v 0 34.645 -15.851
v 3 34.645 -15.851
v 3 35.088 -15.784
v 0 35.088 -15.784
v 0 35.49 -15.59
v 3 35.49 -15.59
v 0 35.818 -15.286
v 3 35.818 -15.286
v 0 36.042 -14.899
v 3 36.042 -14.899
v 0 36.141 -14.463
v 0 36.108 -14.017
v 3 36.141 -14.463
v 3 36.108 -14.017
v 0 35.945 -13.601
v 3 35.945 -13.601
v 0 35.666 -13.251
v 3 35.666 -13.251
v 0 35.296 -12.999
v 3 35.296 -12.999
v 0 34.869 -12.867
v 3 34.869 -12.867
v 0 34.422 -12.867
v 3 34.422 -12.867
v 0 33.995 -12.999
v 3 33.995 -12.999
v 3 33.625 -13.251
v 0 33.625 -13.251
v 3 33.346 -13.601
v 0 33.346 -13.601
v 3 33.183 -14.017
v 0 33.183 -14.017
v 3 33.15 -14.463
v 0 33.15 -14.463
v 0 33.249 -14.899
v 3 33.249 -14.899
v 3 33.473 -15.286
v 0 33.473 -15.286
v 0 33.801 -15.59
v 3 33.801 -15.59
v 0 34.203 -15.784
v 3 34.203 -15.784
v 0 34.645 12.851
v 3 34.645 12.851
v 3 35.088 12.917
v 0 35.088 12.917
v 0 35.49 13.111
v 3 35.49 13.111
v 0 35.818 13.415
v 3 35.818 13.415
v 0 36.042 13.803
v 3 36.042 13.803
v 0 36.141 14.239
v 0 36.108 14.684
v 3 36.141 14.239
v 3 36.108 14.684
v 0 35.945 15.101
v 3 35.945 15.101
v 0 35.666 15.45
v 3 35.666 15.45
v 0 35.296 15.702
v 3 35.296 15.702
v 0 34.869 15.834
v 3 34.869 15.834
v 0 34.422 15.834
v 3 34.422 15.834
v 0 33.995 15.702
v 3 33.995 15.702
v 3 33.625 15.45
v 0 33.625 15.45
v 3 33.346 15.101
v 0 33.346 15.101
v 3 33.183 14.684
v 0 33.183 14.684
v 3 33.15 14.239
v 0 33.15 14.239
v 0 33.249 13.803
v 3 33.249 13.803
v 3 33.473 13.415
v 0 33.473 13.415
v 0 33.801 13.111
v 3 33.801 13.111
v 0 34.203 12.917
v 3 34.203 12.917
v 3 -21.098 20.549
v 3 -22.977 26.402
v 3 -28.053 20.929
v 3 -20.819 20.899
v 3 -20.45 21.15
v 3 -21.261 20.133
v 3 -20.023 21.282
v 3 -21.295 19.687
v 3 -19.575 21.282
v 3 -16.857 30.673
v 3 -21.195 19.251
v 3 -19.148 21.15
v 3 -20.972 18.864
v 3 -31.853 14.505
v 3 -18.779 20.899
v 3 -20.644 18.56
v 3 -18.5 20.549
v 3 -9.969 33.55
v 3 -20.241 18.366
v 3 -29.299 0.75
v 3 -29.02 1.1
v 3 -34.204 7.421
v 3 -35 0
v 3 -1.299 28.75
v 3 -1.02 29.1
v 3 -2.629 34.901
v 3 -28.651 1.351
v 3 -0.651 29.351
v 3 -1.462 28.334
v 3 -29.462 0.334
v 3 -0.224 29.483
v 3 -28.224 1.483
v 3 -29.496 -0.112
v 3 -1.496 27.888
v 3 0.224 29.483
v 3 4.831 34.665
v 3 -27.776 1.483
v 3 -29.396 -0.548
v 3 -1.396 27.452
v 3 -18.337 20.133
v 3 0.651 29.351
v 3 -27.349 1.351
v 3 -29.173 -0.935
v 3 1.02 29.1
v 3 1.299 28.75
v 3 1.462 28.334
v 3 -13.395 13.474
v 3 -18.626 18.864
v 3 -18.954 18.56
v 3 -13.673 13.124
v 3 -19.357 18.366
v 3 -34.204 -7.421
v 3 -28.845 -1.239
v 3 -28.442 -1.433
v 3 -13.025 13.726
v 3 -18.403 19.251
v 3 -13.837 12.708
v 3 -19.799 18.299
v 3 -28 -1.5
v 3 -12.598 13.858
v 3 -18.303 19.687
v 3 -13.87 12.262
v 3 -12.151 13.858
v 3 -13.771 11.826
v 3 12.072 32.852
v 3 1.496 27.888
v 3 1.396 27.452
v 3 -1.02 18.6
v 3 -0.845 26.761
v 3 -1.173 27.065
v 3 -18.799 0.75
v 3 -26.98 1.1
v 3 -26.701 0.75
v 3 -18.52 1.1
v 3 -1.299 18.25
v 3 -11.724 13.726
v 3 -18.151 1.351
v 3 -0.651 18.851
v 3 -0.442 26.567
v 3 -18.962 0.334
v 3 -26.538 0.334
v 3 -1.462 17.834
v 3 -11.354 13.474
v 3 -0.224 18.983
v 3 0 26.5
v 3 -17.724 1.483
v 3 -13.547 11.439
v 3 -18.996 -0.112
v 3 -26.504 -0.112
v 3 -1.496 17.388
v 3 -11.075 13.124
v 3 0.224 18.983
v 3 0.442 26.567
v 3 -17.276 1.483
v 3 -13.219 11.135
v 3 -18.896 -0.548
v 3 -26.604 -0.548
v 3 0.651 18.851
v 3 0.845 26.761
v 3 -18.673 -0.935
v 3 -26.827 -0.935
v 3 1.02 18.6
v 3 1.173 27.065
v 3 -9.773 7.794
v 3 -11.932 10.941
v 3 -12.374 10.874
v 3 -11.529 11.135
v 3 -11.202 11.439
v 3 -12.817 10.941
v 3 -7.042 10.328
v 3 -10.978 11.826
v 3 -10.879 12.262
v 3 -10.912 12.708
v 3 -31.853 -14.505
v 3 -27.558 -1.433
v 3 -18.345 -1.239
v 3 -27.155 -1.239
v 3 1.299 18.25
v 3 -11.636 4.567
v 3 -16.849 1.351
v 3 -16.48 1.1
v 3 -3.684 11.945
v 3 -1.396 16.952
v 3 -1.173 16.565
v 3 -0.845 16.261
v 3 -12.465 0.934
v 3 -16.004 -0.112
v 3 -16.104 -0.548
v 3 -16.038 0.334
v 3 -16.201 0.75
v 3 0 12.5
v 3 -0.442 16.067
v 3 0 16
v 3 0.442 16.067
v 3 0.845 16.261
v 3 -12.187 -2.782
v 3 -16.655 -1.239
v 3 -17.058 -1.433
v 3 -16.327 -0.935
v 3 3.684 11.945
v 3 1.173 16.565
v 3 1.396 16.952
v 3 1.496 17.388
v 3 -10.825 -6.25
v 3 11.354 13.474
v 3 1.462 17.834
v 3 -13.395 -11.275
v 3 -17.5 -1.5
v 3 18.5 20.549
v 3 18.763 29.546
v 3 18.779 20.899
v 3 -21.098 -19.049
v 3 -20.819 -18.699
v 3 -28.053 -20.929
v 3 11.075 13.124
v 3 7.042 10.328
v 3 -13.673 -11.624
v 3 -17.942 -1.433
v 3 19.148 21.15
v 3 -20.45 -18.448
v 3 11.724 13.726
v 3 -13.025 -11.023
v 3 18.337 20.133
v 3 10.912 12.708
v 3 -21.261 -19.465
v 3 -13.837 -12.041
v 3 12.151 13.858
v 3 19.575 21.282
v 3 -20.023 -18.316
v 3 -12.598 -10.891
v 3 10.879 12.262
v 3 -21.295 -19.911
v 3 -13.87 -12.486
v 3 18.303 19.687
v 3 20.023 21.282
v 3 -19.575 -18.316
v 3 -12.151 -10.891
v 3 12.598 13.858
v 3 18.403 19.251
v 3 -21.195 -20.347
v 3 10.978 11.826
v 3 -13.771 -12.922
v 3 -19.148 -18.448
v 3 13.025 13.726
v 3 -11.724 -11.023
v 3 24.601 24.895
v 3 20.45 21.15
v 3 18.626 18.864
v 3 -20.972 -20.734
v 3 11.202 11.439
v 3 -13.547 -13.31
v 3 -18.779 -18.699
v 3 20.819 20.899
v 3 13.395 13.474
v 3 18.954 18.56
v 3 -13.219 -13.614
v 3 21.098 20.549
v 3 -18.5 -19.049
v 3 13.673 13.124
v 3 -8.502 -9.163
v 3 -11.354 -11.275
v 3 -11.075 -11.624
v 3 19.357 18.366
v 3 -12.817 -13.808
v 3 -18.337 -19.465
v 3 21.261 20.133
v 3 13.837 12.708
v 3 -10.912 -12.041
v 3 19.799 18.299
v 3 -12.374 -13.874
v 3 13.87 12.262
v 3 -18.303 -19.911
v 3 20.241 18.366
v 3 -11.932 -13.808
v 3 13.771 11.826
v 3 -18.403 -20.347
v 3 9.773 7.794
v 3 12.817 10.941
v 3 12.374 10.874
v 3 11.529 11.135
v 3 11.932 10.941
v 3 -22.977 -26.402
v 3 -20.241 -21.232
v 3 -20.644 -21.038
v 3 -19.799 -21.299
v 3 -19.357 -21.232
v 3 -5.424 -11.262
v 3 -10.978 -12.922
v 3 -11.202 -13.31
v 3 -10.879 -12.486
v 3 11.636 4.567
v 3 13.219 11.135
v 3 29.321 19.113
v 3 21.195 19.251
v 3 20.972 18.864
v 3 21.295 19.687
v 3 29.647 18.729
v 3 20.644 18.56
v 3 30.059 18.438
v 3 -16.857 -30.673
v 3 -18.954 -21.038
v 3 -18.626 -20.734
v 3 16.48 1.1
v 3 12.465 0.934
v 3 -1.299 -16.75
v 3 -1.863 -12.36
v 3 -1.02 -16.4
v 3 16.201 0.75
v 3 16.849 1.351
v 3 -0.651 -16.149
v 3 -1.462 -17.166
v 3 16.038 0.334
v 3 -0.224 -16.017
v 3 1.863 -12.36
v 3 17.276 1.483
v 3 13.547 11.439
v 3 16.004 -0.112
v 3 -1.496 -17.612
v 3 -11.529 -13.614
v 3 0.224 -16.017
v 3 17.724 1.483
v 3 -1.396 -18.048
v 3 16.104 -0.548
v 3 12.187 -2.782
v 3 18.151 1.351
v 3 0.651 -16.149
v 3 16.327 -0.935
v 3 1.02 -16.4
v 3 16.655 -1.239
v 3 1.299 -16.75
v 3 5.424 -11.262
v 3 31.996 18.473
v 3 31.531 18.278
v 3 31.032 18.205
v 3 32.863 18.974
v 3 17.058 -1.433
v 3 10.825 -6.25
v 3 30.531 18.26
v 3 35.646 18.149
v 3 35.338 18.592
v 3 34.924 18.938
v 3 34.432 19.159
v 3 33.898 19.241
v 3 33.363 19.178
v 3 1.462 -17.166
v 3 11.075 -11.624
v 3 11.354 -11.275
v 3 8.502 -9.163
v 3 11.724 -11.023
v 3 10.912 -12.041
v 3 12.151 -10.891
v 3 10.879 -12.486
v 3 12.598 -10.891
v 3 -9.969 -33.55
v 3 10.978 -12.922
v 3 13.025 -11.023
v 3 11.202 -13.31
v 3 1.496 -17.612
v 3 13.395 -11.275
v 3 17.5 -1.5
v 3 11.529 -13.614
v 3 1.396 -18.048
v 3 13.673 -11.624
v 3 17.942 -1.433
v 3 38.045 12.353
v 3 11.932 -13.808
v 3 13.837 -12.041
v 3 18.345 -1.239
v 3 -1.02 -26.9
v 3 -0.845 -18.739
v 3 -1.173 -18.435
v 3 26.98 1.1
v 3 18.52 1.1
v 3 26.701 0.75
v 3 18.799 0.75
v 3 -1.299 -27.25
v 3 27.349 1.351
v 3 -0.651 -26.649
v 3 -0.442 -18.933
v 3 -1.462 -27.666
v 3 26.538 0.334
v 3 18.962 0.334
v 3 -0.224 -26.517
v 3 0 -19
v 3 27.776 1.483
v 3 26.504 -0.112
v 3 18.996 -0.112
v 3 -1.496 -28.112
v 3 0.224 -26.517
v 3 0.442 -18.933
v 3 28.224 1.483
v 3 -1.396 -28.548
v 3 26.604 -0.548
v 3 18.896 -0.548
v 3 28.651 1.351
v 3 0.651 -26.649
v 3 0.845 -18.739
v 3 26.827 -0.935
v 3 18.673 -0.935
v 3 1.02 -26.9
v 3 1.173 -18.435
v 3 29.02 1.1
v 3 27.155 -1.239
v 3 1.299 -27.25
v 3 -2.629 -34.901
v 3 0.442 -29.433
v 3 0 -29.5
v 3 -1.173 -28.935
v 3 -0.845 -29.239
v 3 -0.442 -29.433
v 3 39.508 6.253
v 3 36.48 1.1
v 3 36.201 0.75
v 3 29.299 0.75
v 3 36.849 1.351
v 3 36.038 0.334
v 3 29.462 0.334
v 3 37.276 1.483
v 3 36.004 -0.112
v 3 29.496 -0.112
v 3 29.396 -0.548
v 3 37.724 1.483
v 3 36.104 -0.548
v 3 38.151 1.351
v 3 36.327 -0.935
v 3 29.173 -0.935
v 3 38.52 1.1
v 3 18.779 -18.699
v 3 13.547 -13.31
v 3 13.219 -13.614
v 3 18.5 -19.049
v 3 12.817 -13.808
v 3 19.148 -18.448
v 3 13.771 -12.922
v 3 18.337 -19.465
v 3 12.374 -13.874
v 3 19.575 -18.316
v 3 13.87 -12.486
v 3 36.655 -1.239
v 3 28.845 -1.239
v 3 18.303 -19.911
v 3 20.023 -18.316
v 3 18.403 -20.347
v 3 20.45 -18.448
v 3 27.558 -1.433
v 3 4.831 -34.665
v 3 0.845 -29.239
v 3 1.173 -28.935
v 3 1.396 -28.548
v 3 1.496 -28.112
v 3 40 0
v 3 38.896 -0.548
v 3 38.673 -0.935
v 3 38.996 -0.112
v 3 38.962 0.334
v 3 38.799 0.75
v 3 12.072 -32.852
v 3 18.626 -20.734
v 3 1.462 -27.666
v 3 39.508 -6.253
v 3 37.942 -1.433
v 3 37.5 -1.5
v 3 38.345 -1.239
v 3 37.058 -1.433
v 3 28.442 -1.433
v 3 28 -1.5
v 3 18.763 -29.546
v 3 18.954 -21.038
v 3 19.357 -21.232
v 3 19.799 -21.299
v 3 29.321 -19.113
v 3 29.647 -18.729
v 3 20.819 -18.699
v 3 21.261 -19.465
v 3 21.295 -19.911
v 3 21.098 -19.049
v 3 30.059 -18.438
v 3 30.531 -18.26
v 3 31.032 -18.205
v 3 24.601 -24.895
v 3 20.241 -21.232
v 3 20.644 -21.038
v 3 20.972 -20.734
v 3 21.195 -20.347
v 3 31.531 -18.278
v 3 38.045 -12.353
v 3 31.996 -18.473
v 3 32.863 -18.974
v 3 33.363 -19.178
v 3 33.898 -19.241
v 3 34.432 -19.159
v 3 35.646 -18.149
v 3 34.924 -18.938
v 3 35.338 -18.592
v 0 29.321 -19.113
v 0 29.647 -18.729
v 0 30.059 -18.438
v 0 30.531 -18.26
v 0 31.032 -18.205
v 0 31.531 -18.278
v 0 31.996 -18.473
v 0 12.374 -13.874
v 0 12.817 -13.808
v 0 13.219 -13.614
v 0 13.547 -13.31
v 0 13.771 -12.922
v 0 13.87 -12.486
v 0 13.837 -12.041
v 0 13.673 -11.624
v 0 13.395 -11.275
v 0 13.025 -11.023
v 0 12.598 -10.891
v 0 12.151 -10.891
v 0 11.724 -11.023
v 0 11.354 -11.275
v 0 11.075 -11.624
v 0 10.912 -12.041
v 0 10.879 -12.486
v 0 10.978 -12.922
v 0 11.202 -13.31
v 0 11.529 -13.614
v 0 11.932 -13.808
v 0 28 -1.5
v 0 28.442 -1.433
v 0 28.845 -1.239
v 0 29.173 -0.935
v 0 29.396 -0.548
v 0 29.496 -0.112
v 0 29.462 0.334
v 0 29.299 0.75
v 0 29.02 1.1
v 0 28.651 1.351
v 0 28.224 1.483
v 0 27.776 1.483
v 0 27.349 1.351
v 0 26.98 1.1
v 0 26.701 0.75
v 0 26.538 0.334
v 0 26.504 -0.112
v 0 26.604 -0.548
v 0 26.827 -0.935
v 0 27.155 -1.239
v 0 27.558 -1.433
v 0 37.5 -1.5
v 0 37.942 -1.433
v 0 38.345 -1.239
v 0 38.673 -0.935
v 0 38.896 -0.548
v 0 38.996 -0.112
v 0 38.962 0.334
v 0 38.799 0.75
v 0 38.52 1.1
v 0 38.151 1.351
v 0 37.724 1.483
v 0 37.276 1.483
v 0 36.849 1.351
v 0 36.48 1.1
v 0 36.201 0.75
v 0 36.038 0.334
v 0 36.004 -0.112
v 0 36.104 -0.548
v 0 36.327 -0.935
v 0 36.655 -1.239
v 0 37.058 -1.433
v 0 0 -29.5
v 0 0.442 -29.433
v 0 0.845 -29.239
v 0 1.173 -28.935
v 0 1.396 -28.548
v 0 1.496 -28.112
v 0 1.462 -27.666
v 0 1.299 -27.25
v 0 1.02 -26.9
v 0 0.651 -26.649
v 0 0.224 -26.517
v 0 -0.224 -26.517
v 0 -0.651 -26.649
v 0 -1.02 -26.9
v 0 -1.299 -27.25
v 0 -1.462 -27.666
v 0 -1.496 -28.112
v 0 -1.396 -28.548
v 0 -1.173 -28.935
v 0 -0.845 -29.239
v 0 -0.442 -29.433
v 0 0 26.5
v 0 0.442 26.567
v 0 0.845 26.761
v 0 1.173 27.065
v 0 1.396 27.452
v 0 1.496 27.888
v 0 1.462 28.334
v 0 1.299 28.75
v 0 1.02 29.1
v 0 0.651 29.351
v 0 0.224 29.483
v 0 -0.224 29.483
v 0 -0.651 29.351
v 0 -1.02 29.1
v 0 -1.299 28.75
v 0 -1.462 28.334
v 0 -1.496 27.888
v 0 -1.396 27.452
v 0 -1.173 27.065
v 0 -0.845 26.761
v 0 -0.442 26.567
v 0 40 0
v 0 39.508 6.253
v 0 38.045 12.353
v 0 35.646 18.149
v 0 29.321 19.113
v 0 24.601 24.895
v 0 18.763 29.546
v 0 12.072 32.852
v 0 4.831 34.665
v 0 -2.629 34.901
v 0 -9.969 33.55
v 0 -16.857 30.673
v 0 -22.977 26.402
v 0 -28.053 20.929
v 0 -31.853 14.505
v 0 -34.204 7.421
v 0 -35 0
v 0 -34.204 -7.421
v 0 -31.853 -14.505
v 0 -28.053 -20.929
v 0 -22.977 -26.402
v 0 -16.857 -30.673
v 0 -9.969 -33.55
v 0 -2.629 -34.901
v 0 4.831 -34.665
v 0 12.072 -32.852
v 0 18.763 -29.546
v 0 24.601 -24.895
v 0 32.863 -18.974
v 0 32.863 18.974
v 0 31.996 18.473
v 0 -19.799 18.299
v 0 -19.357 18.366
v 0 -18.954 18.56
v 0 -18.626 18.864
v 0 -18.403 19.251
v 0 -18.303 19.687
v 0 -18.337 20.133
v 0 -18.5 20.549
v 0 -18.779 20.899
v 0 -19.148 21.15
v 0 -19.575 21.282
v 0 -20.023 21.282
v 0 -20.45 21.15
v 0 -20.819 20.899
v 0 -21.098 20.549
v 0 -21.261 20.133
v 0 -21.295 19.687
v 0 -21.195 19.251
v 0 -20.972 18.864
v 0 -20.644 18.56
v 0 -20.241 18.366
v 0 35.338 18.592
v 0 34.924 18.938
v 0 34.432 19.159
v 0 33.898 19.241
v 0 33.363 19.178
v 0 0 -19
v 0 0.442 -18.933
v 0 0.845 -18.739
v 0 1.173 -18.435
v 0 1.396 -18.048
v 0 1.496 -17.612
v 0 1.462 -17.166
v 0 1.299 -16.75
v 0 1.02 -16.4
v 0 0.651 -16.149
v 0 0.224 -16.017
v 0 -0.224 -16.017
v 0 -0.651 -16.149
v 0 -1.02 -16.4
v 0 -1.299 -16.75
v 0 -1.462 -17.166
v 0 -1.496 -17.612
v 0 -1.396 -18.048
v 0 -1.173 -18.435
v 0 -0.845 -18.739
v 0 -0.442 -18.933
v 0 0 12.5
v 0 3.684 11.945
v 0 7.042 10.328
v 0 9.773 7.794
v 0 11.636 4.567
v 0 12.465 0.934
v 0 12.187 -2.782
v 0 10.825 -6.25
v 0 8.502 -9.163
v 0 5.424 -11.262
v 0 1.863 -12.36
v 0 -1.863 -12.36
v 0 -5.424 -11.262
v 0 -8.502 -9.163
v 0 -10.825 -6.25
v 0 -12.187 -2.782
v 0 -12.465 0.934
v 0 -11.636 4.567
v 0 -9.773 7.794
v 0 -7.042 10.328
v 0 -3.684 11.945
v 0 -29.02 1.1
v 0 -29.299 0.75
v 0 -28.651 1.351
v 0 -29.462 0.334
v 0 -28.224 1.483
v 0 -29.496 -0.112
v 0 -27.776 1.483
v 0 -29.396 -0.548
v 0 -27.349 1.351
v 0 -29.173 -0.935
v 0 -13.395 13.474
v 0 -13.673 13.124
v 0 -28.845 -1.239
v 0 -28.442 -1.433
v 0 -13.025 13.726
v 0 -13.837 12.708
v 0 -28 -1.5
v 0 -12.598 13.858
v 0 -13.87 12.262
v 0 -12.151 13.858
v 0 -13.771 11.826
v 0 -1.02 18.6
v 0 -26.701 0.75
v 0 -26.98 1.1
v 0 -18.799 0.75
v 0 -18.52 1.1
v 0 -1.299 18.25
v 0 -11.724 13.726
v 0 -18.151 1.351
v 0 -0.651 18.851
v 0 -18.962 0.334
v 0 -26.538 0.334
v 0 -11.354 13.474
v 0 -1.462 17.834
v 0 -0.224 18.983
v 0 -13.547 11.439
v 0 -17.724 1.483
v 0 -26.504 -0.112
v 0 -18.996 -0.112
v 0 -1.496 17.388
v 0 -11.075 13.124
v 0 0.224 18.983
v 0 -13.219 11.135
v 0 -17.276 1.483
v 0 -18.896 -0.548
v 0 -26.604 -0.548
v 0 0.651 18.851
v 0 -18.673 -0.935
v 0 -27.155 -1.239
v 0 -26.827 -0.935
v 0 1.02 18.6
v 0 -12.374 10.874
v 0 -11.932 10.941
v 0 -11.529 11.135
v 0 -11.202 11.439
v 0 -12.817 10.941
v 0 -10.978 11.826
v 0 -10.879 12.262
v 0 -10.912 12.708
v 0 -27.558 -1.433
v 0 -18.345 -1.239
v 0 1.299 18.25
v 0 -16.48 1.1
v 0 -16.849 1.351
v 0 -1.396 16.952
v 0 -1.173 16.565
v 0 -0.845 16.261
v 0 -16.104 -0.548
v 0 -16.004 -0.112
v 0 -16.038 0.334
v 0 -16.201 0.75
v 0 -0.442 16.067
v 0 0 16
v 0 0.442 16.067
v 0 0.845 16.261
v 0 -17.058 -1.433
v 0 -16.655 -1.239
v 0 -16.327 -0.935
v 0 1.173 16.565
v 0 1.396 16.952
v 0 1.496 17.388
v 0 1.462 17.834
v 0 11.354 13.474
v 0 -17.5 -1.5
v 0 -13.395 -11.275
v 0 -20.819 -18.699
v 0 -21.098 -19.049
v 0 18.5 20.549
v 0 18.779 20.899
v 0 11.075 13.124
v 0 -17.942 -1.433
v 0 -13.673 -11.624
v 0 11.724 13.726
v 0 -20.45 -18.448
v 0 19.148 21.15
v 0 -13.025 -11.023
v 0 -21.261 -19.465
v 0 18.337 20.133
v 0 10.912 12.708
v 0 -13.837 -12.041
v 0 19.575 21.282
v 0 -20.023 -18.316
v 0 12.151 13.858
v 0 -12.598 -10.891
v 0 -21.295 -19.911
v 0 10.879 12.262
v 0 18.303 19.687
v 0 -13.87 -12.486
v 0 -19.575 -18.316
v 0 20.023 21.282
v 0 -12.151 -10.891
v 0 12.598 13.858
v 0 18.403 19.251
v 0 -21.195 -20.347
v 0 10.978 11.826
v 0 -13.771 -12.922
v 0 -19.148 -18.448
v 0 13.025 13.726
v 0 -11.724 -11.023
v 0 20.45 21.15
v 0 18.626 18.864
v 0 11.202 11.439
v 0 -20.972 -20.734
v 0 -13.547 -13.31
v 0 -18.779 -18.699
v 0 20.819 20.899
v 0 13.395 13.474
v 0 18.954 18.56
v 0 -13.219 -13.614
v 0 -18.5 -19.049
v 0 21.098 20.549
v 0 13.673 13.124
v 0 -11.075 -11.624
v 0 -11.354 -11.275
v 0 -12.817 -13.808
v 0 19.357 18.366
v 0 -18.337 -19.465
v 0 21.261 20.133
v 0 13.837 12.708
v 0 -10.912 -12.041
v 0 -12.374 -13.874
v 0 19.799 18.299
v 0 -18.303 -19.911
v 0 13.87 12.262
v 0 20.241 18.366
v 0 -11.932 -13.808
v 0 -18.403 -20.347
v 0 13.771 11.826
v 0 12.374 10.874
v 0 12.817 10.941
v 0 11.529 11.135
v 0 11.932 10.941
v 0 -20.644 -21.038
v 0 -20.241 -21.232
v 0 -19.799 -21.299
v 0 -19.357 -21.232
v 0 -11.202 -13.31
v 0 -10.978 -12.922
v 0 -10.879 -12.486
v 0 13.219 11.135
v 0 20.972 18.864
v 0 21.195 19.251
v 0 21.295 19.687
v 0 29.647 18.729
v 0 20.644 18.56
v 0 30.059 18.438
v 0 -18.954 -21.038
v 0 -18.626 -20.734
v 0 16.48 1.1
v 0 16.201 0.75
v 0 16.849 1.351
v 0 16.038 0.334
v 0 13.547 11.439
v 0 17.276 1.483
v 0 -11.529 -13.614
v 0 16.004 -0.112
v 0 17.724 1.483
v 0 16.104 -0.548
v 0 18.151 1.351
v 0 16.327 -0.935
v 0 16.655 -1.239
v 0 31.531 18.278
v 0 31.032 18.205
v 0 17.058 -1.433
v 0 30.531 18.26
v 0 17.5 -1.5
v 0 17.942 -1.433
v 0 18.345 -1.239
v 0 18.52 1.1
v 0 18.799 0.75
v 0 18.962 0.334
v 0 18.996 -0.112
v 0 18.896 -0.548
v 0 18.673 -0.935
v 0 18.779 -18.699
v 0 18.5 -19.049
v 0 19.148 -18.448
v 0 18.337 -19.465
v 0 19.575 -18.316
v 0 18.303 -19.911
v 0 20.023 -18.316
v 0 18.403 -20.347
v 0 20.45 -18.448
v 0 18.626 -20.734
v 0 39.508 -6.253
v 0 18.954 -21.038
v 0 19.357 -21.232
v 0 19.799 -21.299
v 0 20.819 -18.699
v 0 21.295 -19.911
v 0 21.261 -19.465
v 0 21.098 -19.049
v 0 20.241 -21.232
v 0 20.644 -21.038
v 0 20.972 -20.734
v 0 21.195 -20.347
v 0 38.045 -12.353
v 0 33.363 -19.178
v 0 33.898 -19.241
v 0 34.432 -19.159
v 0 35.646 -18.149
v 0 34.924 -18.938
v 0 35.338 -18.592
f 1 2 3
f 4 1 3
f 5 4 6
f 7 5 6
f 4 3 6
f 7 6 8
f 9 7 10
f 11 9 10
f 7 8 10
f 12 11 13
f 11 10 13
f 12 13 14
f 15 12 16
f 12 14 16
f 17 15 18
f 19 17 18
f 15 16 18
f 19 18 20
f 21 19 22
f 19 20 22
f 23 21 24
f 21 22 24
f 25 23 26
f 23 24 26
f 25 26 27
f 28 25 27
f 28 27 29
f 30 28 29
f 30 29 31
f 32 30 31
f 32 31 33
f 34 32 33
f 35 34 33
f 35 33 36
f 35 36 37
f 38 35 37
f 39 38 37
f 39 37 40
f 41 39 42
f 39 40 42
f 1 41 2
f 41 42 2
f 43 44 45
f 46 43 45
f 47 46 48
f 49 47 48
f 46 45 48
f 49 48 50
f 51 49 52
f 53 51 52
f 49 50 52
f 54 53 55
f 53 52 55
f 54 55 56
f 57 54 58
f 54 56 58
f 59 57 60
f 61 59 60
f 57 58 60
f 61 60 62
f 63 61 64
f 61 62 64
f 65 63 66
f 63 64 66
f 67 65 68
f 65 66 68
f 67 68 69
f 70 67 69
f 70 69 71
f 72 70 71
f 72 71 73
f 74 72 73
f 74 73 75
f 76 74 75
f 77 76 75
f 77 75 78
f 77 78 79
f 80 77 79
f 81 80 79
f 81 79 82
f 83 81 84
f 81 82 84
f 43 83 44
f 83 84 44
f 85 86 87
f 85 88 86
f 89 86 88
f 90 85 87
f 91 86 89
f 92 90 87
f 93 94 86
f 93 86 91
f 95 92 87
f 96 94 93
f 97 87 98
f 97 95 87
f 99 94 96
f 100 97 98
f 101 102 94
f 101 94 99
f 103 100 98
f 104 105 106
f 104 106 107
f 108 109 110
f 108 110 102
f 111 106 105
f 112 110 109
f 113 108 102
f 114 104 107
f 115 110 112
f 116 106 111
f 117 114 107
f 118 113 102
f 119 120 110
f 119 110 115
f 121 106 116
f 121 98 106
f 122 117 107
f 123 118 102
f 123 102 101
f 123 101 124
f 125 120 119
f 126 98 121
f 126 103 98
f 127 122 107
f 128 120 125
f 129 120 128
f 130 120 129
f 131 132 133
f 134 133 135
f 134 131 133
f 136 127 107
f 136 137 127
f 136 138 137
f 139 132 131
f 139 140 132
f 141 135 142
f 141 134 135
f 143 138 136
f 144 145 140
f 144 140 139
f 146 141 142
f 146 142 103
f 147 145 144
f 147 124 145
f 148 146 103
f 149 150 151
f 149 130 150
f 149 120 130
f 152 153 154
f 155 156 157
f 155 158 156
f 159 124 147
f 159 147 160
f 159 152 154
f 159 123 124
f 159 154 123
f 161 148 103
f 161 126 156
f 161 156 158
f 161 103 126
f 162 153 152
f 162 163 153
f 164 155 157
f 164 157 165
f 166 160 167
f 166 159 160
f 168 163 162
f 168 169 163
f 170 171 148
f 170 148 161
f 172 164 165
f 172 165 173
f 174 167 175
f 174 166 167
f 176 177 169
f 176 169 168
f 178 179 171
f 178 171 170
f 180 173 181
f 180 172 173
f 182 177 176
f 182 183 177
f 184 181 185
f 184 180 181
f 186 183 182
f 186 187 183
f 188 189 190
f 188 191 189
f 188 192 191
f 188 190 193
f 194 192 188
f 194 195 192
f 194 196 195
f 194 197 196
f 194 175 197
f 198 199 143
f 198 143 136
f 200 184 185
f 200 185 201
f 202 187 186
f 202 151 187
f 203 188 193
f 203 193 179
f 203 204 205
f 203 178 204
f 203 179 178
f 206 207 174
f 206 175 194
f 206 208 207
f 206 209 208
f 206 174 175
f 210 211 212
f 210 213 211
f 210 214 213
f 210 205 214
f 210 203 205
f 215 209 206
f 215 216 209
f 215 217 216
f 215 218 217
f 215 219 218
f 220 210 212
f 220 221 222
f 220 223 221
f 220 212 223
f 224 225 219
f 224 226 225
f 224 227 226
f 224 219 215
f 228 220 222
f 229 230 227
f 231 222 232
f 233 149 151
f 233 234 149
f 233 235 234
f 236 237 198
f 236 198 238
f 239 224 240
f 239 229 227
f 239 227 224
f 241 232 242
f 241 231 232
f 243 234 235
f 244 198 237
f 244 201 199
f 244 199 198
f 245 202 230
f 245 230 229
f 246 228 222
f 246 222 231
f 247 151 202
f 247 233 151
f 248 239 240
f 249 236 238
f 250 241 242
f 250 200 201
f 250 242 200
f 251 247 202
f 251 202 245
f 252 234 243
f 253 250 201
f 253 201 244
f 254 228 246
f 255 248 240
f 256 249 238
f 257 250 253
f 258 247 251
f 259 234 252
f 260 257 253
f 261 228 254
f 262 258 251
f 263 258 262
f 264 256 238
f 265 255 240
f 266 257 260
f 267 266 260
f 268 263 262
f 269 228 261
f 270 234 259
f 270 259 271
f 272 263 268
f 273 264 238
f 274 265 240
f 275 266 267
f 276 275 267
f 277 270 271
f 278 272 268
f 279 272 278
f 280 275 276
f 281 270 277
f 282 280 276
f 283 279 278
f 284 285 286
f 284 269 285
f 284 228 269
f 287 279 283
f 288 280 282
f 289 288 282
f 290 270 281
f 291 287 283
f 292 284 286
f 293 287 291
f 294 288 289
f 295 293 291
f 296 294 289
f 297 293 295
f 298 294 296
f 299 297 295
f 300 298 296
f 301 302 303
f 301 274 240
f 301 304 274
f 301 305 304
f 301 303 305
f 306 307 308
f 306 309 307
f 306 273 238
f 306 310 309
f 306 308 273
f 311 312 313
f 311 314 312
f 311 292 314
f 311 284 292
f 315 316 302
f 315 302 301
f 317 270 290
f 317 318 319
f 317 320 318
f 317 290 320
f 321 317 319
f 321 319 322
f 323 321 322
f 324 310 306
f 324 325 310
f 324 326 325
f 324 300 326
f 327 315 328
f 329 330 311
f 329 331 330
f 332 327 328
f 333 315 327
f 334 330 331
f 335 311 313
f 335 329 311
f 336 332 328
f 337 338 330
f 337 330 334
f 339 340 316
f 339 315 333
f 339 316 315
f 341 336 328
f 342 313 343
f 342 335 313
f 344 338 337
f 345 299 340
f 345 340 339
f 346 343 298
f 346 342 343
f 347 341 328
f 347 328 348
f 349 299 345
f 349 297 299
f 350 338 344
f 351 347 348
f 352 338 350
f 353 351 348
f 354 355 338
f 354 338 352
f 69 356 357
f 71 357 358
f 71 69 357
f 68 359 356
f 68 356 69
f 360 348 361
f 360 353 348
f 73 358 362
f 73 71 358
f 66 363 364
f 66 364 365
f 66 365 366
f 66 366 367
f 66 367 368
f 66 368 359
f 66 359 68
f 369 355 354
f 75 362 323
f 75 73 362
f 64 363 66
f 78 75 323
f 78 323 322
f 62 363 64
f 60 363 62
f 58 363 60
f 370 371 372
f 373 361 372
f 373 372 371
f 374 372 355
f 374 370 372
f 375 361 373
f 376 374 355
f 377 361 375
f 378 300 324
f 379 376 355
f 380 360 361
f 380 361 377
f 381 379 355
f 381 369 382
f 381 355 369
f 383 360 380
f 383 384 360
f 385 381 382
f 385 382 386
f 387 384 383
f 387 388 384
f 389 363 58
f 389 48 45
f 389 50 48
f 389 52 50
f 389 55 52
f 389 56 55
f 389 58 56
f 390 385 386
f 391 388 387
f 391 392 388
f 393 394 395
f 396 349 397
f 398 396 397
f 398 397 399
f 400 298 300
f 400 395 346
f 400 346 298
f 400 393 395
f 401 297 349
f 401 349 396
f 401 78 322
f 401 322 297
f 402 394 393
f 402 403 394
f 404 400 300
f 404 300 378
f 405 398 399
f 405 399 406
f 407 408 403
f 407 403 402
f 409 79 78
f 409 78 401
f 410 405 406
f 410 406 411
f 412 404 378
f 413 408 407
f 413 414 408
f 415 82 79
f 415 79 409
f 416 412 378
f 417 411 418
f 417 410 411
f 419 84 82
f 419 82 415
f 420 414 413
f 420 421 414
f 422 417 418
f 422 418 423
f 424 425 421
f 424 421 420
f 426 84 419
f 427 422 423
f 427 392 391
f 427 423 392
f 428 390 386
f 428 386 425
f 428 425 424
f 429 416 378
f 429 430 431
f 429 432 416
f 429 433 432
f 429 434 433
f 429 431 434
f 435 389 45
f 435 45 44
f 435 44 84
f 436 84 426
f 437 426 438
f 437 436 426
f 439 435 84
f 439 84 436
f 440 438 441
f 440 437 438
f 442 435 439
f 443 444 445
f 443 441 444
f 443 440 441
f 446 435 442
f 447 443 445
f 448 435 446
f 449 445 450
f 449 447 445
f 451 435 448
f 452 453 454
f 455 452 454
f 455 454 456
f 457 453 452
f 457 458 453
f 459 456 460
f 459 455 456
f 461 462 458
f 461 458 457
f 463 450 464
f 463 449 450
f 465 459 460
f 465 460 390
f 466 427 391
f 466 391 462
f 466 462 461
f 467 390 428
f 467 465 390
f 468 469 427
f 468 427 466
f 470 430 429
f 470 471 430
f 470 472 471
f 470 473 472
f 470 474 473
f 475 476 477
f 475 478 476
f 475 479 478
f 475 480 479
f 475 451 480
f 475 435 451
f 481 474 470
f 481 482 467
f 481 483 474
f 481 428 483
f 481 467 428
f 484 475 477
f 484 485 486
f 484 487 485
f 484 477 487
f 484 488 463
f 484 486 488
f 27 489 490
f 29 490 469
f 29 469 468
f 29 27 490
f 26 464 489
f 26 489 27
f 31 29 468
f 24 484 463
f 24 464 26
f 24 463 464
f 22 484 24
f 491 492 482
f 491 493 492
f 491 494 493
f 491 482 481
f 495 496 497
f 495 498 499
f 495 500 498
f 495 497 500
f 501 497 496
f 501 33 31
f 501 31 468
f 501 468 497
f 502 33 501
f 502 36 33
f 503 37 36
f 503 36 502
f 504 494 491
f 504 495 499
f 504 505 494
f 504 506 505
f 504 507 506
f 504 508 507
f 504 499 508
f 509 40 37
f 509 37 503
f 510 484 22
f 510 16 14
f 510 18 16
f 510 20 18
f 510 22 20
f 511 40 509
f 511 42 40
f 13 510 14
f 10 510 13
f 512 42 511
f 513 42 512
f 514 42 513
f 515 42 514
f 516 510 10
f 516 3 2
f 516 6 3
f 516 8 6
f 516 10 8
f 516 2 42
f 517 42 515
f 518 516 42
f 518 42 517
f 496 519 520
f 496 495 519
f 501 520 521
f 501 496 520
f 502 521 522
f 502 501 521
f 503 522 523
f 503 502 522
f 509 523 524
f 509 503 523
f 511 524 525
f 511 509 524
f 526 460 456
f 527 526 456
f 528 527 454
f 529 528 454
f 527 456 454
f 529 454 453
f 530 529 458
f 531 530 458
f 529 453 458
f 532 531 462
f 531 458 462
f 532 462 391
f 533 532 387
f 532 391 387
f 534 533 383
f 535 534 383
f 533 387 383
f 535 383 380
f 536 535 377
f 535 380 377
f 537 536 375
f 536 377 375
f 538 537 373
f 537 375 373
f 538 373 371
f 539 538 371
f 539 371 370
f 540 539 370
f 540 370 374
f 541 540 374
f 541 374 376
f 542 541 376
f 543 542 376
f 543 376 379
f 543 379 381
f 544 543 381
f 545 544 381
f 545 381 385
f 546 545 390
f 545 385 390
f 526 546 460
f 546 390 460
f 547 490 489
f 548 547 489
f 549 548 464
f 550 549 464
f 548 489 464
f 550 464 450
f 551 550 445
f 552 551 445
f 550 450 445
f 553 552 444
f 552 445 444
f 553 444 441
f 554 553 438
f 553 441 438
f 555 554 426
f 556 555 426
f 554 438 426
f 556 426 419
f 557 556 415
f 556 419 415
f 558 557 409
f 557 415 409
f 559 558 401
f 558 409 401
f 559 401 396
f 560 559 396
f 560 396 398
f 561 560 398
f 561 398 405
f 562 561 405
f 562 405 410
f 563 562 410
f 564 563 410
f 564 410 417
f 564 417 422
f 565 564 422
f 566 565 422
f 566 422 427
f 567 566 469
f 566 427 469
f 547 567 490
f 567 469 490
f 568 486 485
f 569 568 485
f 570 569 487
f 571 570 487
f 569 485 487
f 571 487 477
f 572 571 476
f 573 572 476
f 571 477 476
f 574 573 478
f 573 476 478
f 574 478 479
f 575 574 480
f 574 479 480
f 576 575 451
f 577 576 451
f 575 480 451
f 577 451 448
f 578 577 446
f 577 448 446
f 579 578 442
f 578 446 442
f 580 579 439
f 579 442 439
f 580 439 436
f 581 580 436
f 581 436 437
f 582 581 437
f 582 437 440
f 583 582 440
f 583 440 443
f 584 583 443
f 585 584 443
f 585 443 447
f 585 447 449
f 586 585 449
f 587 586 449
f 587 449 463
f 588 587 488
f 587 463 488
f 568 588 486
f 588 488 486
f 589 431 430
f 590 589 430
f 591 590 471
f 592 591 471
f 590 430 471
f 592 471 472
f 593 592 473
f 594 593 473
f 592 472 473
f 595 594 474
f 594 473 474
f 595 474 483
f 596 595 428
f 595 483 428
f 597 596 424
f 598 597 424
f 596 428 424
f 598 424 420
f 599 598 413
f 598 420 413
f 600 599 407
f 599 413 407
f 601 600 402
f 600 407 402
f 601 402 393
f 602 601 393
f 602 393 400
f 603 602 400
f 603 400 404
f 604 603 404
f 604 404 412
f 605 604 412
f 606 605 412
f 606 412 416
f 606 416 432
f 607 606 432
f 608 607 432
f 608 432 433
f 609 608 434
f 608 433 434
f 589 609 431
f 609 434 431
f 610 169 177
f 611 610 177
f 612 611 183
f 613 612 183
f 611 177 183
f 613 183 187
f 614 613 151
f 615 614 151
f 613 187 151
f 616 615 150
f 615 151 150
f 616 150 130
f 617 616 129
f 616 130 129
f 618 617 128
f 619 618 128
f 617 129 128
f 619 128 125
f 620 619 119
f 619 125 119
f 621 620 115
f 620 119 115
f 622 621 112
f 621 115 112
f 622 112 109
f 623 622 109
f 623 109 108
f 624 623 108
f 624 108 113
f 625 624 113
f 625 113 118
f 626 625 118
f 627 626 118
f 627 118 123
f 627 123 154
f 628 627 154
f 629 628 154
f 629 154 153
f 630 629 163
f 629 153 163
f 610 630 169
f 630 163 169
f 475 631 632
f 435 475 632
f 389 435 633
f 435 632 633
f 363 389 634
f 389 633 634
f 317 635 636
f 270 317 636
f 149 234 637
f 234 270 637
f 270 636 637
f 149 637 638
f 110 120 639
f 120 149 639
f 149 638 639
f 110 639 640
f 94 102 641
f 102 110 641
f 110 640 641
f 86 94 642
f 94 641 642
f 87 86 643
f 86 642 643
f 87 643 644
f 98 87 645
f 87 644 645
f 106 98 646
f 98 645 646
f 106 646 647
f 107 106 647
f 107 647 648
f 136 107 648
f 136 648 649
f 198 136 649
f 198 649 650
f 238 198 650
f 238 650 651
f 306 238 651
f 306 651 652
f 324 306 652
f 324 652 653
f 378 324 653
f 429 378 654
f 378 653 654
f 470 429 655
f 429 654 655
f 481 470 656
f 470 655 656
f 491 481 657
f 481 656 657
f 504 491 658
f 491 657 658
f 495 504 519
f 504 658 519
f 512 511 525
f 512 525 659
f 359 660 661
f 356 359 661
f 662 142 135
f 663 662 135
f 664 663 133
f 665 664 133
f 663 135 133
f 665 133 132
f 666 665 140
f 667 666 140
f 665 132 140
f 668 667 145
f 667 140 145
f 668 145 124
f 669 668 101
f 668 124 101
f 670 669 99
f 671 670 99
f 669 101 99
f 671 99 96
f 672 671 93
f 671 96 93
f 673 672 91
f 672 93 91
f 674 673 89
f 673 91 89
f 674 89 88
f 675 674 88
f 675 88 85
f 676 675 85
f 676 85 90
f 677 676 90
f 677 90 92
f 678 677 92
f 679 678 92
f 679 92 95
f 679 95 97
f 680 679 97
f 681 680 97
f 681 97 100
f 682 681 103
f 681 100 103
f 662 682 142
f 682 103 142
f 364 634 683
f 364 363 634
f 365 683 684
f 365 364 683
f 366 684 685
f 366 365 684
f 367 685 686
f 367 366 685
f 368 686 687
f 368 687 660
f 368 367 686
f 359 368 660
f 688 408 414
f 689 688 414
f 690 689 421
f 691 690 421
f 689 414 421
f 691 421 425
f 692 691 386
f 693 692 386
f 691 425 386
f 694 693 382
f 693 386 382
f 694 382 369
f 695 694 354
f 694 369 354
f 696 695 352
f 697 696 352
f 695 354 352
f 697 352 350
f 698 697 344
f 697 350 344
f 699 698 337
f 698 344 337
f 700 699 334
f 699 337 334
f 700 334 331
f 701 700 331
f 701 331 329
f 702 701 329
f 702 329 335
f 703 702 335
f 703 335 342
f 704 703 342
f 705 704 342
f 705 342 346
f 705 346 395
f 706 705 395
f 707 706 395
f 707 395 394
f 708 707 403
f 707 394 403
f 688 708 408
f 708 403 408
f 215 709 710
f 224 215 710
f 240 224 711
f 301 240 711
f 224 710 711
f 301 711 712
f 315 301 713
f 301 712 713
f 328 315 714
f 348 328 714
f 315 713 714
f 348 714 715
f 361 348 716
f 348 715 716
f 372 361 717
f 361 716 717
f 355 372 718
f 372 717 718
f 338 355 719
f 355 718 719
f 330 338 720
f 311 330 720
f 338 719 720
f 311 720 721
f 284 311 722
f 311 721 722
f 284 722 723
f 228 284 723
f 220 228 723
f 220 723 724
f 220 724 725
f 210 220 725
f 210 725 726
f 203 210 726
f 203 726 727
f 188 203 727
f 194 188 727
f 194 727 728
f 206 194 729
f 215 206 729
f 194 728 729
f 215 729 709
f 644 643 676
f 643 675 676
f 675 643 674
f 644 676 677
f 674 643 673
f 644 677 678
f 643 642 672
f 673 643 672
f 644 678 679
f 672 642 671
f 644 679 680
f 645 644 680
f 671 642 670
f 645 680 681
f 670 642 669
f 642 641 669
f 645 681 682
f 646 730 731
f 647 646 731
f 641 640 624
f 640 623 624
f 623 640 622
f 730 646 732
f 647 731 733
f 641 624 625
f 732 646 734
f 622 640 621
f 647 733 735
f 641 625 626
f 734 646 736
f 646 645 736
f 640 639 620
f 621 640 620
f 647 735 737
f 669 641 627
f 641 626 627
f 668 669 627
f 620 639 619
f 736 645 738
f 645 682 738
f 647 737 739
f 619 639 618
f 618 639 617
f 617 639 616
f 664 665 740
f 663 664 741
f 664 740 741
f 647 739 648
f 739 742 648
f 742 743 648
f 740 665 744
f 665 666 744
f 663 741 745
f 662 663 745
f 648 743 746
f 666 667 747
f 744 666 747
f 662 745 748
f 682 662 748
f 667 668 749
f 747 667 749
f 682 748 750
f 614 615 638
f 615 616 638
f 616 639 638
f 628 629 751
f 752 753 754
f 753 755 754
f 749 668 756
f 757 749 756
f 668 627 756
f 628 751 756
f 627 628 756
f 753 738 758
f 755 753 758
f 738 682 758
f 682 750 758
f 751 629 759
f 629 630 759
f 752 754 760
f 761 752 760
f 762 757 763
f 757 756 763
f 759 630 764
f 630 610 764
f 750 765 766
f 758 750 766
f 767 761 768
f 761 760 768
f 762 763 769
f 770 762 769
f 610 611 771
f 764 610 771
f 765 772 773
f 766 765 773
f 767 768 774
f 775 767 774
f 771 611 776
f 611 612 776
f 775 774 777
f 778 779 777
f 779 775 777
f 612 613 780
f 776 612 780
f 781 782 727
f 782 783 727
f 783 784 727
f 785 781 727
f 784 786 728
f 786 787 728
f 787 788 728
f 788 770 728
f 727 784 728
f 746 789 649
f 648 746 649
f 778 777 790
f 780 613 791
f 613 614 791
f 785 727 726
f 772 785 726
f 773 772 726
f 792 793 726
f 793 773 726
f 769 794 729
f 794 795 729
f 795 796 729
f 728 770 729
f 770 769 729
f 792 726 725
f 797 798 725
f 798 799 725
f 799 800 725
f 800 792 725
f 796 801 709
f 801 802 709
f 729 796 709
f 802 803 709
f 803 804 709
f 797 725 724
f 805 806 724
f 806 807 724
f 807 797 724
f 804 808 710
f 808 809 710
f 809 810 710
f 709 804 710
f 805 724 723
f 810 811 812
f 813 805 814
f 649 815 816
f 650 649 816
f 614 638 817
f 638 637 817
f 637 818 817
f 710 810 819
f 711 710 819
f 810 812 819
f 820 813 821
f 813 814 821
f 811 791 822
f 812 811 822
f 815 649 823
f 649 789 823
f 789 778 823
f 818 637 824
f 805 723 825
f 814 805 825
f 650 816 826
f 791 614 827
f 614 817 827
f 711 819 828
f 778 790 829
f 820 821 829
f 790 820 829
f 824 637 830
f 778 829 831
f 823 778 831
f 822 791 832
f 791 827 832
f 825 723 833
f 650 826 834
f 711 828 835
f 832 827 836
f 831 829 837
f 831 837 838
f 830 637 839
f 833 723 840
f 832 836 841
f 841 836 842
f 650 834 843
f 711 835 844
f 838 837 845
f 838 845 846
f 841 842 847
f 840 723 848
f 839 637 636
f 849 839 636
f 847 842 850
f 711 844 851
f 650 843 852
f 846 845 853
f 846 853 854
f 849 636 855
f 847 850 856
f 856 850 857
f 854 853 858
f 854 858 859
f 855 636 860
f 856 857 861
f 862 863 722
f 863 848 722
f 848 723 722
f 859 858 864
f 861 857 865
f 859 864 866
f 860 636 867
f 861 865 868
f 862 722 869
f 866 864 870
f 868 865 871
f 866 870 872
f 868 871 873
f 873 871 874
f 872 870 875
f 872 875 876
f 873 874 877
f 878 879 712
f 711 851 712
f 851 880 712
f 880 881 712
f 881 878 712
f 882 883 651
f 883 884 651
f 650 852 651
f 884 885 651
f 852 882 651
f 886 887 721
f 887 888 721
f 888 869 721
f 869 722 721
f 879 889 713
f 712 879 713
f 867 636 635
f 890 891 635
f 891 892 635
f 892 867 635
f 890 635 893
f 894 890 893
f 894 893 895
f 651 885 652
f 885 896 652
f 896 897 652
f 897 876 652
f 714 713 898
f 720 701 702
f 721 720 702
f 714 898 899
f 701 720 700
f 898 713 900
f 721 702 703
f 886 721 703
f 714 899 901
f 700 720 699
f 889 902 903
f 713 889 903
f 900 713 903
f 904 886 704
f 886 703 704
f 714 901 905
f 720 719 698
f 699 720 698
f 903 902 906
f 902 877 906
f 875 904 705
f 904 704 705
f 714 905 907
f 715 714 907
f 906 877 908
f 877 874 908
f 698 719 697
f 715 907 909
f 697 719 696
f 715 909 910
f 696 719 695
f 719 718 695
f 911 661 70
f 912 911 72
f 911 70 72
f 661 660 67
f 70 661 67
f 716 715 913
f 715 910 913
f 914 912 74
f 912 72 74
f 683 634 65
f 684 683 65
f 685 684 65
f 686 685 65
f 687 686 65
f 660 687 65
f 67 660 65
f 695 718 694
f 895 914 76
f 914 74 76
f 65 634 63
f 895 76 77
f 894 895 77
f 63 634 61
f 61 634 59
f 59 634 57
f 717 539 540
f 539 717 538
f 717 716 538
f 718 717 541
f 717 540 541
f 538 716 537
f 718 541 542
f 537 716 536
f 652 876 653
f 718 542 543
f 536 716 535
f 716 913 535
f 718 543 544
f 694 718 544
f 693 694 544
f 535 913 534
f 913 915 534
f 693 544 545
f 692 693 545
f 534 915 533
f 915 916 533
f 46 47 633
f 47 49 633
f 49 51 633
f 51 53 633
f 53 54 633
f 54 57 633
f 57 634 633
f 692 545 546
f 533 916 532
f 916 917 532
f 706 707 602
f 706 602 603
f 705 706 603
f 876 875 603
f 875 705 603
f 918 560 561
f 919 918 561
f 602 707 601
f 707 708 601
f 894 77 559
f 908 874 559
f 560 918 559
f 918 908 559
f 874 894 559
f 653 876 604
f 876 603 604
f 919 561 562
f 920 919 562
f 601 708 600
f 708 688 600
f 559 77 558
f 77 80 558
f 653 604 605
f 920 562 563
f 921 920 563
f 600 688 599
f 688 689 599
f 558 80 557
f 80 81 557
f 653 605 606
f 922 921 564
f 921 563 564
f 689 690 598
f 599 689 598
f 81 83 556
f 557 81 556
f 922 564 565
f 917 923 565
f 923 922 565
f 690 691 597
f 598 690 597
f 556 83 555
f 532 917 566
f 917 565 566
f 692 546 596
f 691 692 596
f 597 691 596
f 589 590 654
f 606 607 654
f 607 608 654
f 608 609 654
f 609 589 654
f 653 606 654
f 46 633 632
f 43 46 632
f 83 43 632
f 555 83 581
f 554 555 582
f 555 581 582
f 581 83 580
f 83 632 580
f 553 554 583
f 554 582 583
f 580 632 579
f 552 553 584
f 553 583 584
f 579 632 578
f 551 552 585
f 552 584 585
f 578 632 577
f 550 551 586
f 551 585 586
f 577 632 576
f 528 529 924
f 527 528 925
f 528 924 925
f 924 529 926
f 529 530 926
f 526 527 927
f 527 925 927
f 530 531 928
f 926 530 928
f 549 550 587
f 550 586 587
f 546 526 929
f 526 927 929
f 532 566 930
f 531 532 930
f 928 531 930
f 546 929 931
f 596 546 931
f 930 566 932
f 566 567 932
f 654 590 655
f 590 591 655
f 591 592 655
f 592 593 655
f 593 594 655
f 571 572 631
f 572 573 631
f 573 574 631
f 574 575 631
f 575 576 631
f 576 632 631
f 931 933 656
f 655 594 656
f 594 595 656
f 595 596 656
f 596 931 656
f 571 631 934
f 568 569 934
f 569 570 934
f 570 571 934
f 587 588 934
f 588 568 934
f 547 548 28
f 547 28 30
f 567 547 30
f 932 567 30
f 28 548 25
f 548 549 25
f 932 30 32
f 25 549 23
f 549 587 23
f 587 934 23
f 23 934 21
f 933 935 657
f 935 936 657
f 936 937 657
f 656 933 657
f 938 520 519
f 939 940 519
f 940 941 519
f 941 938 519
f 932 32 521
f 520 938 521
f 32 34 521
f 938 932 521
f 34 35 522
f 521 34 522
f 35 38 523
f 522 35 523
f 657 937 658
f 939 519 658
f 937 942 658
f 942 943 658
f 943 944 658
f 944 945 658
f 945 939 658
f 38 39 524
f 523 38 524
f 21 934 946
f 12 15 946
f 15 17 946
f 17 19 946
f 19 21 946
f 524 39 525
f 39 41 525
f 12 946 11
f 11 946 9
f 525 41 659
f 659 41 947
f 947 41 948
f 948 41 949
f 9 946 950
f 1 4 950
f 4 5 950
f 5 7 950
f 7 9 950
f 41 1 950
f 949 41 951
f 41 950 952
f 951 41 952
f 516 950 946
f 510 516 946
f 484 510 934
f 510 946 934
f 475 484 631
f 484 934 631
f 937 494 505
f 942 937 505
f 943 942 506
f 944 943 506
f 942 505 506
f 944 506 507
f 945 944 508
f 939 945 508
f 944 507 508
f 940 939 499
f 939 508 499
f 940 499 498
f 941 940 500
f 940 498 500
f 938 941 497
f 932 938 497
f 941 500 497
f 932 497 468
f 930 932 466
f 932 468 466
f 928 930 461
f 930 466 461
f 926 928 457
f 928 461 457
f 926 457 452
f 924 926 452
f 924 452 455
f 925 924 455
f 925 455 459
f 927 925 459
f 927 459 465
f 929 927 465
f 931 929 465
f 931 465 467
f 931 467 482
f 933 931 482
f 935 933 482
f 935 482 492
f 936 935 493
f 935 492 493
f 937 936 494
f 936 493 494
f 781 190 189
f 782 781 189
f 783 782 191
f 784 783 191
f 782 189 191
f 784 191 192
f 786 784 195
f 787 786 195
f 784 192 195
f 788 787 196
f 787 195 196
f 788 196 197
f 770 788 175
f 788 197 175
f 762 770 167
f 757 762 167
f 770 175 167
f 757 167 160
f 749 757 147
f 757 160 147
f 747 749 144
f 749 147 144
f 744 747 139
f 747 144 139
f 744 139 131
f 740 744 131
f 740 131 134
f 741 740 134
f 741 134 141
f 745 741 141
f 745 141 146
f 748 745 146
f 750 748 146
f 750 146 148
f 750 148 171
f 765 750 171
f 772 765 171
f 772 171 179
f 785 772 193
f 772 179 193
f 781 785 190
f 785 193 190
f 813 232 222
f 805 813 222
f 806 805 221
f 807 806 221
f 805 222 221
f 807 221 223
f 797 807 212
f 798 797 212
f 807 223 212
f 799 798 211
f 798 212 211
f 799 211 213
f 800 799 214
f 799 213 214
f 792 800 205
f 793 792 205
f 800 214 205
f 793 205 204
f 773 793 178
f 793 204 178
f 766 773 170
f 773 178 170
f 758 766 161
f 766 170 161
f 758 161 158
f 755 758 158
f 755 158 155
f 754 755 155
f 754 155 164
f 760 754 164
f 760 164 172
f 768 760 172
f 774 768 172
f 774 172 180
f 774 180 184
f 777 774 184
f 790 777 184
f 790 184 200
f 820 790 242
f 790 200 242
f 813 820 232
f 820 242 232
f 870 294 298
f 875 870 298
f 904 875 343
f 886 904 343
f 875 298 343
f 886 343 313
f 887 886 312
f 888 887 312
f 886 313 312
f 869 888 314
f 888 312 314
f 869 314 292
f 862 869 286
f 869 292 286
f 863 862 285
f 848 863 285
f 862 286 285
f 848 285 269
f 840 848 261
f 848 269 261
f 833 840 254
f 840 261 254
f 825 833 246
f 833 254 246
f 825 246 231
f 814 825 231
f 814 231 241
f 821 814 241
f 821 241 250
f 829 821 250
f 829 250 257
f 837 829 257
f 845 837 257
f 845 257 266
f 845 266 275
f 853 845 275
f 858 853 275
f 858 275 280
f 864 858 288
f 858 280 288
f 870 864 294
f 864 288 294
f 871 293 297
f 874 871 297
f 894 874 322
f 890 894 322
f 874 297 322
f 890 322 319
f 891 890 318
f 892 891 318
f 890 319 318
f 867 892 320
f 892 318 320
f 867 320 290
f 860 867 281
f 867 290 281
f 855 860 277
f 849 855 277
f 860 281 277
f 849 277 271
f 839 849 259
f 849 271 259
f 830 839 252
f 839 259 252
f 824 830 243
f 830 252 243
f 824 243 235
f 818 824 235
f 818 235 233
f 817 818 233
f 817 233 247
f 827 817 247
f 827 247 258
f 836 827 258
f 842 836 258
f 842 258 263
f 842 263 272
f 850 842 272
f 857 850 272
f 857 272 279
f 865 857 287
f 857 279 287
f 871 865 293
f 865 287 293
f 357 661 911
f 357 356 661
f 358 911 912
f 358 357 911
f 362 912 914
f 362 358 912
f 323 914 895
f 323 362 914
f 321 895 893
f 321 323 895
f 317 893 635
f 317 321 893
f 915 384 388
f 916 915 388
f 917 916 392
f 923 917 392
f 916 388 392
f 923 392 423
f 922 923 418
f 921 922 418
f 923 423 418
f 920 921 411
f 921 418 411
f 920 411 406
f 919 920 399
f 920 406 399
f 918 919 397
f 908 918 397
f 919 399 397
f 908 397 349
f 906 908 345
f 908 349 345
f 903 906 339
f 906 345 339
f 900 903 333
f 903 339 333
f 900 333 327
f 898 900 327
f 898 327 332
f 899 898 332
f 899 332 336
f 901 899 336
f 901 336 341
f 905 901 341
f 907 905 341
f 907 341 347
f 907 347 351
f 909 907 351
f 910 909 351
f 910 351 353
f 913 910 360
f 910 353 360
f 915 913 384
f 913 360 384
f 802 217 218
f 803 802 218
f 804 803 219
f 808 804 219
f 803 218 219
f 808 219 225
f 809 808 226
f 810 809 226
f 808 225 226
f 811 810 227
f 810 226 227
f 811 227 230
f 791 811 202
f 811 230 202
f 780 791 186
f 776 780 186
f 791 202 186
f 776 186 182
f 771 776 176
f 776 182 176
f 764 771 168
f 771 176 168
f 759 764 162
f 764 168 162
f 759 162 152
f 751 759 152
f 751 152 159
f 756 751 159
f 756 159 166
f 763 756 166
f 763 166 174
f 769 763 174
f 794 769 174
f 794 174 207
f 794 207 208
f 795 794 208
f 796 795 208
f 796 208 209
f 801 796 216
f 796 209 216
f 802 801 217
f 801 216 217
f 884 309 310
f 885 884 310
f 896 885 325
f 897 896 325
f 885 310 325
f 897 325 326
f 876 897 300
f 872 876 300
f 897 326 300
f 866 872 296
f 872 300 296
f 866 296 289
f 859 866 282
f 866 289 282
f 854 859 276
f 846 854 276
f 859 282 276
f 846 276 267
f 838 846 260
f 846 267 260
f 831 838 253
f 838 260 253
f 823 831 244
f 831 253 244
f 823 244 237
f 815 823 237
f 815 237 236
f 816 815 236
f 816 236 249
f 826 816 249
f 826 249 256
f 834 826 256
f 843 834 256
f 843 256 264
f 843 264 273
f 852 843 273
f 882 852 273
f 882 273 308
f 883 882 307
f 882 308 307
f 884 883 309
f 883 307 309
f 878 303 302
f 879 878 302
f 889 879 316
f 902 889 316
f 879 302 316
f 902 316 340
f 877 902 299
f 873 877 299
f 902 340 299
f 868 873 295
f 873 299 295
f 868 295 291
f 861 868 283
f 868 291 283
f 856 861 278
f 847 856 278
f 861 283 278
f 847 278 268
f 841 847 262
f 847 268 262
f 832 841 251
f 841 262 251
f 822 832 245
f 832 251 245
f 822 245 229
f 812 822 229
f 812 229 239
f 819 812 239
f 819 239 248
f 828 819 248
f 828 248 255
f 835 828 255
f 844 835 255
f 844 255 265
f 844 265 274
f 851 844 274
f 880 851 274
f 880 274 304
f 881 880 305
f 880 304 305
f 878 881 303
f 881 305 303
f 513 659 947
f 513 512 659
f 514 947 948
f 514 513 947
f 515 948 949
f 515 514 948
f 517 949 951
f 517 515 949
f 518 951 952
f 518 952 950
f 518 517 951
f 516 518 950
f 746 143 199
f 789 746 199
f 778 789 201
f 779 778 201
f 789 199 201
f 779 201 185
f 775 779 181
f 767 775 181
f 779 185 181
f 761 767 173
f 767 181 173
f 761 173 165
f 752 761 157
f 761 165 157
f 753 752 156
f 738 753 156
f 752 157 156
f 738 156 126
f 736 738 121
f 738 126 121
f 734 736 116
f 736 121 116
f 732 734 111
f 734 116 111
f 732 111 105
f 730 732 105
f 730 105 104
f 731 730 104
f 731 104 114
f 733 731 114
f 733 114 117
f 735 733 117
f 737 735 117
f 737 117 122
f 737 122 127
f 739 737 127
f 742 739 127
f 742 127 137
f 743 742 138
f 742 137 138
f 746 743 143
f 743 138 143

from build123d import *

# Parameters (mm, degrees)
SKETCH_1_R          = 35
EXTRUDE_1_DEPTH     = 3
SKETCH_2_R          = 1.5
CUT_EXTRUDE_1_DEPTH = 3
SKETCH_3_R          = 1.5
CUT_EXTRUDE_2_DEPTH = 3
SKETCH_4_R          = 12.5
CUT_EXTRUDE_3_DEPTH = 3
EXTRUDE_START       = -3
EXTRUDE_4_DEPTH     = 3
FILLET_1_R          = 2
FILLET_2_R          = 2
FILLET_3_R          = 2
FILLET_4_R          = 2
SKETCH_6_R          = 1.5
CUT_EXTRUDE_4_DEPTH = 3


with BuildPart() as part:
    # 草图1 → 凸台-拉伸1 (new body)
    with BuildSketch(Plane(origin=(0, 0, 0), x_dir=(0, 0, -1), z_dir=(1, 0, 0))):
        Circle(SKETCH_1_R)
    extrude(amount=EXTRUDE_1_DEPTH)

    # 草图2 → 切除-拉伸1 (cut)
    with BuildSketch(Plane(origin=(3, 0, 0), x_dir=(0, 0, -1), z_dir=(1, 0, 0))):
        with Locations((0, 28)):
            Circle(SKETCH_2_R)
        with Locations((19.798989873, 19.798989873)):
            Circle(SKETCH_2_R)
        with Locations((28, 0)):
            Circle(SKETCH_2_R)
        with Locations((19.798989873, -19.798989873)):
            Circle(SKETCH_2_R)
        with Locations((0, -28)):
            Circle(SKETCH_2_R)
        with Locations((-19.798989873, -19.798989873)):
            Circle(SKETCH_2_R)
        with Locations((-28, 0)):
            Circle(SKETCH_2_R)
        with Locations((-19.798989873, 19.798989873)):
            Circle(SKETCH_2_R)
    extrude(amount=-CUT_EXTRUDE_1_DEPTH, mode=Mode.SUBTRACT)

    # 草图3 → 切除-拉伸2 (cut)
    with BuildSketch(Plane(origin=(3, 0, 0), x_dir=(0, 0, -1), z_dir=(1, 0, 0))):
        with Locations((0, 17.5)):
            Circle(SKETCH_3_R)
        with Locations((12.374368671, 12.374368671)):
            Circle(SKETCH_3_R)
        with Locations((17.5, 0)):
            Circle(SKETCH_3_R)
        with Locations((12.374368671, -12.374368671)):
            Circle(SKETCH_3_R)
        with Locations((0, -17.5)):
            Circle(SKETCH_3_R)
        with Locations((-12.374368671, -12.374368671)):
            Circle(SKETCH_3_R)
        with Locations((-17.5, 0)):
            Circle(SKETCH_3_R)
        with Locations((-12.374368671, 12.374368671)):
            Circle(SKETCH_3_R)
    extrude(amount=-CUT_EXTRUDE_2_DEPTH, mode=Mode.SUBTRACT)

    # 草图4 → 切除-拉伸3 (cut)
    with BuildSketch(Plane.ZY):
        Circle(SKETCH_4_R)
    extrude(amount=-CUT_EXTRUDE_3_DEPTH, mode=Mode.SUBTRACT)

    # 草图5 → 凸台-拉伸4 (add)
    with BuildSketch(Plane(origin=(3, 0, 0), x_dir=(0, 0, -1), z_dir=(1, 0, 0)).offset(EXTRUDE_START)):
        with BuildLine():
            Line((-20, 34.641016151), (-17.5, 30.310889132))
            ThreePointArc((-17.5, 30.310889132), (-9.058666579, 33.80740392), (0, 35))
            Line((0, 35), (0, 40))
            ThreePointArc((0, 40), (-10.352761804, 38.637033052), (-20, 34.641016151))
        make_face()
        with BuildLine():
            ThreePointArc((0, 35), (9.058666579, 33.80740392), (17.5, 30.310889132))
            Line((17.5, 30.310889132), (20, 34.641016151))
            ThreePointArc((20, 34.641016151), (10.352761804, 38.637033052), (0, 40))
            Line((0, 40), (0, 35))
        make_face()
    extrude(amount=EXTRUDE_4_DEPTH)

    # 圆角1
    fillet_1_edges = [part.edges().sort_by_distance(p)[0] for p in [
        (1.5, 34.641016151, 20),
    ]]
    fillet(fillet_1_edges, radius=FILLET_1_R)

    # 圆角2
    fillet_2_edges = [part.edges().sort_by_distance(p)[0] for p in [
        (1.5, 30.310889132, 17.5),
    ]]
    fillet(fillet_2_edges, radius=FILLET_2_R)

    # 圆角3
    fillet_3_edges = [part.edges().sort_by_distance(p)[0] for p in [
        (1.5, 30.310889132, -17.5),
    ]]
    fillet(fillet_3_edges, radius=FILLET_3_R)

    # 圆角4
    fillet_4_edges = [part.edges().sort_by_distance(p)[0] for p in [
        (1.5, 34.641016151, -20),
    ]]
    fillet(fillet_4_edges, radius=FILLET_4_R)

    # 草图6 → 切除-拉伸4 (cut)
    with BuildSketch(Plane(origin=(3, 0, 0), x_dir=(0, 0, -1), z_dir=(1, 0, 0))):
        with Locations((0, 37.5)):
            Circle(SKETCH_6_R)
        with Locations((14.350628714, 34.645482469)):
            Circle(SKETCH_6_R)
        with Locations((-14.350628714, 34.645482469)):
            Circle(SKETCH_6_R)
    extrude(amount=-CUT_EXTRUDE_4_DEPTH, mode=Mode.SUBTRACT)


solid = part.part
